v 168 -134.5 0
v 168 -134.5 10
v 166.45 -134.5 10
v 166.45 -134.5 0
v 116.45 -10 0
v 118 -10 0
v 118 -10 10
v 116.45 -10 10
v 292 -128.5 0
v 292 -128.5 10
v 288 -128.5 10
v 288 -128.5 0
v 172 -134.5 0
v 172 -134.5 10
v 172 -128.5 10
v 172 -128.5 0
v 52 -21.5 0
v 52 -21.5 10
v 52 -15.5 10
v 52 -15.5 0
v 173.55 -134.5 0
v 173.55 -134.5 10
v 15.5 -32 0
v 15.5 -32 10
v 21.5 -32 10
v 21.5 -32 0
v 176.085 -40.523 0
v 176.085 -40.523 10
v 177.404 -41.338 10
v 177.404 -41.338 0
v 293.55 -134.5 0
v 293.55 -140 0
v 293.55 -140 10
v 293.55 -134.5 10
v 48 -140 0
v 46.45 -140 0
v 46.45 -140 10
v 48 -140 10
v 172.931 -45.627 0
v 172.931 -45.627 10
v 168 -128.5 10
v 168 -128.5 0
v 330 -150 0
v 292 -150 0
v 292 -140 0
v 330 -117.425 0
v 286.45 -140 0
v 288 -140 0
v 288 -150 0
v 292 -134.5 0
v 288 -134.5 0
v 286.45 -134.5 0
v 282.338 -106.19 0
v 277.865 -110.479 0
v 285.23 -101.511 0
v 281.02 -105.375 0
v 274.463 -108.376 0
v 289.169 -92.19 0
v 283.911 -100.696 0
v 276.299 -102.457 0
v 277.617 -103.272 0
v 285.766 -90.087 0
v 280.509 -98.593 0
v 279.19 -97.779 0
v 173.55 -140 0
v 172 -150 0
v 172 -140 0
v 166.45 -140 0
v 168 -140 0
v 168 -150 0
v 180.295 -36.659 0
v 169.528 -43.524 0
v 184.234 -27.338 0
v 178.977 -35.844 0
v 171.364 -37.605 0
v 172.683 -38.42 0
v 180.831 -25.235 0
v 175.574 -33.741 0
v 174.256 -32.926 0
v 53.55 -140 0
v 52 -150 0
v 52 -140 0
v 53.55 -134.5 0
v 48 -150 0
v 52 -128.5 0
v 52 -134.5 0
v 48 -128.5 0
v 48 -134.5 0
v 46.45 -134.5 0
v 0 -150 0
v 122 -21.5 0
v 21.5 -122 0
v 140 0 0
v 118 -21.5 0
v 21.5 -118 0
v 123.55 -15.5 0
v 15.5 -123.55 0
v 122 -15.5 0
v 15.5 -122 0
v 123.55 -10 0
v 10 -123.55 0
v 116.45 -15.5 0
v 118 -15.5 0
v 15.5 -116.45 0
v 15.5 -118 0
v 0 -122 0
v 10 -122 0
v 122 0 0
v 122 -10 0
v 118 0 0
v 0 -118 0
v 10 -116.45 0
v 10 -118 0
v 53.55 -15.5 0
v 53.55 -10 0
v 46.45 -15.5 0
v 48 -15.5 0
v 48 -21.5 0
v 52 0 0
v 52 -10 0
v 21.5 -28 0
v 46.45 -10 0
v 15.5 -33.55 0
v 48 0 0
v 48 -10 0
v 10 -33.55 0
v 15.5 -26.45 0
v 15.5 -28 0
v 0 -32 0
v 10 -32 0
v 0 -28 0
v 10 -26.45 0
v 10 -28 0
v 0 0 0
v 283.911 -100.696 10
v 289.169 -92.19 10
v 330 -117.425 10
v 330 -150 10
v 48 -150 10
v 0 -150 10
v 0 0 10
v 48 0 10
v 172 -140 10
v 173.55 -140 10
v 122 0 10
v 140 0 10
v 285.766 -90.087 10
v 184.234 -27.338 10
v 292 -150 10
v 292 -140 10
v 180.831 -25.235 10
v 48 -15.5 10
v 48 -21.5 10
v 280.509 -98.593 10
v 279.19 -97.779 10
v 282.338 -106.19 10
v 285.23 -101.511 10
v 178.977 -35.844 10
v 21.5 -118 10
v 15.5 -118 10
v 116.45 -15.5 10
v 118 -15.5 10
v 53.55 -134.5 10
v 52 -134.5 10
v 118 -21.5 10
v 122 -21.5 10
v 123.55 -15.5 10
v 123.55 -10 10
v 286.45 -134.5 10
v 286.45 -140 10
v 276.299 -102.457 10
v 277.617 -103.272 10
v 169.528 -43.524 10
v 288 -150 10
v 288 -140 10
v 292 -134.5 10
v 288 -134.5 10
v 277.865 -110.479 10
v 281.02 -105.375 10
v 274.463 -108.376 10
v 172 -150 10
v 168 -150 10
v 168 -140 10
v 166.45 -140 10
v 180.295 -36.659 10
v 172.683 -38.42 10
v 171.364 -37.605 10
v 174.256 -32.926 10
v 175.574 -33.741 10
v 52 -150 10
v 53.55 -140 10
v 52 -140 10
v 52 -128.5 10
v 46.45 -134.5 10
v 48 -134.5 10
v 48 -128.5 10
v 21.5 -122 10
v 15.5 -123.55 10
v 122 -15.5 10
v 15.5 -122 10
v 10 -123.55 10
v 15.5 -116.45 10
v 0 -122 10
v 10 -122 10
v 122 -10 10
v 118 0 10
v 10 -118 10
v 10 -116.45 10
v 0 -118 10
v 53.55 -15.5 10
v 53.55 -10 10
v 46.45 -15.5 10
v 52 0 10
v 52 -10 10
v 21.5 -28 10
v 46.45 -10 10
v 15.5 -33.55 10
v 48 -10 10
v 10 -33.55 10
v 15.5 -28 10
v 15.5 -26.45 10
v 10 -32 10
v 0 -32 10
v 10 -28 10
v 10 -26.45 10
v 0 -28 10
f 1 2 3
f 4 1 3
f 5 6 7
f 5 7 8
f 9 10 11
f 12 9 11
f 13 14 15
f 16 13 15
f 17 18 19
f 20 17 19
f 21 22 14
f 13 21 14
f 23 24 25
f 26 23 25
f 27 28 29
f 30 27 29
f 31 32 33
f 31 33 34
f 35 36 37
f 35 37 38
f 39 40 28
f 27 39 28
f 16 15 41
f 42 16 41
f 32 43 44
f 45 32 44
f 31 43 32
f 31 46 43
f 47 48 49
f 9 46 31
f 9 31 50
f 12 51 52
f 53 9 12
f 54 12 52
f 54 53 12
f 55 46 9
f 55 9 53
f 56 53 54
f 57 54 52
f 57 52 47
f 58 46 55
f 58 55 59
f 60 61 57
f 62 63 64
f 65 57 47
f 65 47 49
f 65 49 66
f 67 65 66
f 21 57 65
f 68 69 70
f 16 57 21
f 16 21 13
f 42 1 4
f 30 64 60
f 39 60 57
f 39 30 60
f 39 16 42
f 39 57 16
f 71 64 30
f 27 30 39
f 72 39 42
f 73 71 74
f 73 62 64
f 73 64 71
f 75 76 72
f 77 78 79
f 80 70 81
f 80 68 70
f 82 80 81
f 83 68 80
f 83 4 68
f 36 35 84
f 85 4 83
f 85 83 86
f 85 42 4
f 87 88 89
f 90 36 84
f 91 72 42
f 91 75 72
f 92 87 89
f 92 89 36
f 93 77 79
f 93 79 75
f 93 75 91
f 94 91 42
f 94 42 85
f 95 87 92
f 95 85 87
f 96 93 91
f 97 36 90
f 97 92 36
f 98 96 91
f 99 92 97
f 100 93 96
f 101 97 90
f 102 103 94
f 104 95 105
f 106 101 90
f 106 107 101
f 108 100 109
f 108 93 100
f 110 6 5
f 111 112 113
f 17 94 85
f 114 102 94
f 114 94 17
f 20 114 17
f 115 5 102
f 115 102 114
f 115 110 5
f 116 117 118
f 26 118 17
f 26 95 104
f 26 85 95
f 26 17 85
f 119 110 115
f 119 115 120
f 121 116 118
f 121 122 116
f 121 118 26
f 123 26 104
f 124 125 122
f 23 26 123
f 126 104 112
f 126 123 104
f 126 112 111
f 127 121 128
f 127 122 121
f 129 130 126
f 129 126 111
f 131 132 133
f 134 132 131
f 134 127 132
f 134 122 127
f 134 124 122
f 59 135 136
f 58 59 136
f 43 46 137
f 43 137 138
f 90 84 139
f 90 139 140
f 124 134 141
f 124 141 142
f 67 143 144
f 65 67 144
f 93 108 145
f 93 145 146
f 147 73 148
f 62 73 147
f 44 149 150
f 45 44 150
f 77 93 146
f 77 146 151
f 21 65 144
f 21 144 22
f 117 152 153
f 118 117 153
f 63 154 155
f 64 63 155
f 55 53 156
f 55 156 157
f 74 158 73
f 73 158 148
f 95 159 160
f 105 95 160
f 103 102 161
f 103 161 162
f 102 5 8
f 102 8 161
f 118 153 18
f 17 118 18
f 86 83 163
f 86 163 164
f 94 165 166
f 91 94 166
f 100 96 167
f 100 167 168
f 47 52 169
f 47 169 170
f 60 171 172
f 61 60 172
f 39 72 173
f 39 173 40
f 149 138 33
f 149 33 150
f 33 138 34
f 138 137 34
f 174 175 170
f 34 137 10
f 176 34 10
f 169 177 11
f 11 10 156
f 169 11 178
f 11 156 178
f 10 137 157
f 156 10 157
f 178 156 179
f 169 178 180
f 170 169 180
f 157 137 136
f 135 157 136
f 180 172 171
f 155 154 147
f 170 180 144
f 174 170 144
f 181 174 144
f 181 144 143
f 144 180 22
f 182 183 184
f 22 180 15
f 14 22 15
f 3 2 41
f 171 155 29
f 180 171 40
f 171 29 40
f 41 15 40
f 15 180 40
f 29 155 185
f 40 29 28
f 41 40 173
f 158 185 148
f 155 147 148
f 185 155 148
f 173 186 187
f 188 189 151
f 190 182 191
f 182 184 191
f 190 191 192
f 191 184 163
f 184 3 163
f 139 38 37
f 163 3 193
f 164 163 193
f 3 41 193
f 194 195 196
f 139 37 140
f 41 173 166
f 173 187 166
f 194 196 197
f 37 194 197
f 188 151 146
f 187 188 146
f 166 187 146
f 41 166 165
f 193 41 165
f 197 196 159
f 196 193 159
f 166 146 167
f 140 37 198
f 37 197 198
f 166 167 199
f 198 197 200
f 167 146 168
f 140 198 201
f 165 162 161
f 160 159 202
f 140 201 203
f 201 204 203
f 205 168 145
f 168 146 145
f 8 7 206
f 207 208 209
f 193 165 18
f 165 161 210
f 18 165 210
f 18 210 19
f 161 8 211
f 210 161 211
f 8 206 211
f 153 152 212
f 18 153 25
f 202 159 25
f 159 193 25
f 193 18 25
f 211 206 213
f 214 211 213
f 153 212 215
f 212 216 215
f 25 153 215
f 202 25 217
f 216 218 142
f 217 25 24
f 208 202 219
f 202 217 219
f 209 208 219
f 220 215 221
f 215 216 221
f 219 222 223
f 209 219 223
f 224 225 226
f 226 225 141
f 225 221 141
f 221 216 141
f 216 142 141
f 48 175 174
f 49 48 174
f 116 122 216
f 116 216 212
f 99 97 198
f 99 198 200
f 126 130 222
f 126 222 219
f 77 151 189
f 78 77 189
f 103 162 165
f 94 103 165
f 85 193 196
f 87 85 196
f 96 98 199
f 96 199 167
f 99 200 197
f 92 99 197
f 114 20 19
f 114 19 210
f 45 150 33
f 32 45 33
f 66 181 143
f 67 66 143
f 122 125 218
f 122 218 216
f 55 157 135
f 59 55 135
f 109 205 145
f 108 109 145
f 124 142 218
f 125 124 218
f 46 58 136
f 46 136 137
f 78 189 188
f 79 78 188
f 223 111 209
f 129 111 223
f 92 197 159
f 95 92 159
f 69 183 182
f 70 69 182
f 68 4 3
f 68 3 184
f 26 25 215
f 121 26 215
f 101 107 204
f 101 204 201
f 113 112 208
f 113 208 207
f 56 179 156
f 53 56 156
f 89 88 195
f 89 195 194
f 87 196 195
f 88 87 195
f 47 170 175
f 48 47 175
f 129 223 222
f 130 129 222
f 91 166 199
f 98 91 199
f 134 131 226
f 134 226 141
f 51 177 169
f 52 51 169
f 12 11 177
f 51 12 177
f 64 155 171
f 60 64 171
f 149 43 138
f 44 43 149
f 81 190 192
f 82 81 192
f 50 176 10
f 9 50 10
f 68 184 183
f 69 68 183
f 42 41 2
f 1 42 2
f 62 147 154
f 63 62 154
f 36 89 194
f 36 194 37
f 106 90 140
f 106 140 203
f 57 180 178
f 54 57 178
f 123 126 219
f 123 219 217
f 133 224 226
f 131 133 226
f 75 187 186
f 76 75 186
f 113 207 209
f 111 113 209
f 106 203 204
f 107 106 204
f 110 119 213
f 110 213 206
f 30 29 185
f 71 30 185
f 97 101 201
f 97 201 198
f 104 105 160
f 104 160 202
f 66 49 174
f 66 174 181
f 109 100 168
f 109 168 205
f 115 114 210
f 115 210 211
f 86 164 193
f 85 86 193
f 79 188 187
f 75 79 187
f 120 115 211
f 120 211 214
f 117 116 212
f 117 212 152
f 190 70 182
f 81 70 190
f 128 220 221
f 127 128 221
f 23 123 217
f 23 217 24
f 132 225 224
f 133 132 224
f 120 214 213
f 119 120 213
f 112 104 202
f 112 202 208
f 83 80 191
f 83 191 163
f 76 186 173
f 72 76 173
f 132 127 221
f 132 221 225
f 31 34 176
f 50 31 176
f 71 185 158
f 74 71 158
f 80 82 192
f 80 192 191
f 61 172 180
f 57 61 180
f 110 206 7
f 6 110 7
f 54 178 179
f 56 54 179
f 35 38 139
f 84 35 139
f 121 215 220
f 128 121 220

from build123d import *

# Parameters (mm, degrees)
BOSS_EXTRU_1_DEPTH      = 10
ENL_V_MAT_EXTRU_1_DEPTH = 10
ENL_V_MAT_EXTRU_2_DEPTH = 10
ENL_V_MAT_EXTRU_3_DEPTH = 10


with BuildPart() as part:
    # Esquisse1 → Boss.-Extru.1 (new body)
    with BuildSketch(Plane.XY):
        Polygon((0, 0), (140, 0), (330, -117.424565968), (330, -150), (0, -150), align=None)
    extrude(amount=BOSS_EXTRU_1_DEPTH)

    # Esquisse2 → Enlèv. mat.-Extru.1 (cut)
    with BuildSketch(Plane.XY.offset(10)):
        Polygon((48, -140), (48, -150), (52, -150), (52, -140), (53.55, -140), (53.55, -134.5), (52, -134.5), (52, -128.5), (48, -128.5), (48, -134.5), (46.45, -134.5), (46.45, -140), align=None)
        Polygon((168, -140), (168, -150), (172, -150), (172, -140), (173.55, -140), (173.55, -134.5), (172, -134.5), (172, -128.5), (168, -128.5), (168, -134.5), (166.45, -134.5), (166.45, -140), align=None)
        Polygon((288, -140), (288, -150), (292, -150), (292, -140), (293.55, -140), (293.55, -134.5), (292, -134.5), (292, -128.5), (288, -128.5), (288, -134.5), (286.45, -134.5), (286.45, -140), align=None)
        Polygon((10, -28), (0, -28), (0, -32), (10, -32), (10, -33.55), (15.5, -33.55), (15.5, -32), (21.5, -32), (21.5, -28), (15.5, -28), (15.5, -26.45), (10, -26.45), align=None)
        Polygon((10, -118), (0, -118), (0, -122), (10, -122), (10, -123.55), (15.5, -123.55), (15.5, -122), (21.5, -122), (21.5, -118), (15.5, -118), (15.5, -116.45), (10, -116.45), align=None)
    extrude(amount=-ENL_V_MAT_EXTRU_1_DEPTH, mode=Mode.SUBTRACT)

    # Esquisse3 → Enlèv. mat.-Extru.2 (cut)
    with BuildSketch(Plane.XY.offset(10)):
        Polygon((48, 0), (48, -10), (46.45, -10), (46.45, -15.5), (48, -15.5), (48, -21.5), (52, -21.5), (52, -15.5), (53.55, -15.5), (53.55, -10), (52, -10), (52, 0), align=None)
        Polygon((118, 0), (118, -10), (116.45, -10), (116.45, -15.5), (118, -15.5), (118, -21.5), (122, -21.5), (122, -15.5), (123.55, -15.5), (123.55, -10), (122, -10), (122, 0), align=None)
    extrude(amount=-ENL_V_MAT_EXTRU_2_DEPTH, mode=Mode.SUBTRACT)

    # Esquisse4 → Enlèv. mat.-Extru.3 (cut)
    with BuildSketch(Plane.XY.offset(10)):
        Polygon((180.831420624, -25.234799183), (175.574170795, -33.741345146), (174.25565617, -32.926471422), (171.364168764, -37.605071702), (172.682683388, -38.419945426), (169.528333491, -43.523873004), (172.930951876, -45.626772936), (176.085301774, -40.522845358), (177.403816398, -41.337719081), (180.295303804, -36.659118802), (178.97678918, -35.844245078), (184.23403901, -27.337699114), align=None)
        Polygon((285.76596099, -90.086866854), (280.50871116, -98.593412817), (279.190196536, -97.778539093), (276.29870913, -102.457139373), (277.617223754, -103.272013097), (274.462873856, -108.375940675), (277.865492242, -110.478840607), (281.019842139, -105.374913029), (282.338356764, -106.189786752), (285.22984417, -101.511186473), (283.911329546, -100.696312749), (289.168579376, -92.189766786), align=None)
    extrude(amount=-ENL_V_MAT_EXTRU_3_DEPTH, mode=Mode.SUBTRACT)


solid = part.part
